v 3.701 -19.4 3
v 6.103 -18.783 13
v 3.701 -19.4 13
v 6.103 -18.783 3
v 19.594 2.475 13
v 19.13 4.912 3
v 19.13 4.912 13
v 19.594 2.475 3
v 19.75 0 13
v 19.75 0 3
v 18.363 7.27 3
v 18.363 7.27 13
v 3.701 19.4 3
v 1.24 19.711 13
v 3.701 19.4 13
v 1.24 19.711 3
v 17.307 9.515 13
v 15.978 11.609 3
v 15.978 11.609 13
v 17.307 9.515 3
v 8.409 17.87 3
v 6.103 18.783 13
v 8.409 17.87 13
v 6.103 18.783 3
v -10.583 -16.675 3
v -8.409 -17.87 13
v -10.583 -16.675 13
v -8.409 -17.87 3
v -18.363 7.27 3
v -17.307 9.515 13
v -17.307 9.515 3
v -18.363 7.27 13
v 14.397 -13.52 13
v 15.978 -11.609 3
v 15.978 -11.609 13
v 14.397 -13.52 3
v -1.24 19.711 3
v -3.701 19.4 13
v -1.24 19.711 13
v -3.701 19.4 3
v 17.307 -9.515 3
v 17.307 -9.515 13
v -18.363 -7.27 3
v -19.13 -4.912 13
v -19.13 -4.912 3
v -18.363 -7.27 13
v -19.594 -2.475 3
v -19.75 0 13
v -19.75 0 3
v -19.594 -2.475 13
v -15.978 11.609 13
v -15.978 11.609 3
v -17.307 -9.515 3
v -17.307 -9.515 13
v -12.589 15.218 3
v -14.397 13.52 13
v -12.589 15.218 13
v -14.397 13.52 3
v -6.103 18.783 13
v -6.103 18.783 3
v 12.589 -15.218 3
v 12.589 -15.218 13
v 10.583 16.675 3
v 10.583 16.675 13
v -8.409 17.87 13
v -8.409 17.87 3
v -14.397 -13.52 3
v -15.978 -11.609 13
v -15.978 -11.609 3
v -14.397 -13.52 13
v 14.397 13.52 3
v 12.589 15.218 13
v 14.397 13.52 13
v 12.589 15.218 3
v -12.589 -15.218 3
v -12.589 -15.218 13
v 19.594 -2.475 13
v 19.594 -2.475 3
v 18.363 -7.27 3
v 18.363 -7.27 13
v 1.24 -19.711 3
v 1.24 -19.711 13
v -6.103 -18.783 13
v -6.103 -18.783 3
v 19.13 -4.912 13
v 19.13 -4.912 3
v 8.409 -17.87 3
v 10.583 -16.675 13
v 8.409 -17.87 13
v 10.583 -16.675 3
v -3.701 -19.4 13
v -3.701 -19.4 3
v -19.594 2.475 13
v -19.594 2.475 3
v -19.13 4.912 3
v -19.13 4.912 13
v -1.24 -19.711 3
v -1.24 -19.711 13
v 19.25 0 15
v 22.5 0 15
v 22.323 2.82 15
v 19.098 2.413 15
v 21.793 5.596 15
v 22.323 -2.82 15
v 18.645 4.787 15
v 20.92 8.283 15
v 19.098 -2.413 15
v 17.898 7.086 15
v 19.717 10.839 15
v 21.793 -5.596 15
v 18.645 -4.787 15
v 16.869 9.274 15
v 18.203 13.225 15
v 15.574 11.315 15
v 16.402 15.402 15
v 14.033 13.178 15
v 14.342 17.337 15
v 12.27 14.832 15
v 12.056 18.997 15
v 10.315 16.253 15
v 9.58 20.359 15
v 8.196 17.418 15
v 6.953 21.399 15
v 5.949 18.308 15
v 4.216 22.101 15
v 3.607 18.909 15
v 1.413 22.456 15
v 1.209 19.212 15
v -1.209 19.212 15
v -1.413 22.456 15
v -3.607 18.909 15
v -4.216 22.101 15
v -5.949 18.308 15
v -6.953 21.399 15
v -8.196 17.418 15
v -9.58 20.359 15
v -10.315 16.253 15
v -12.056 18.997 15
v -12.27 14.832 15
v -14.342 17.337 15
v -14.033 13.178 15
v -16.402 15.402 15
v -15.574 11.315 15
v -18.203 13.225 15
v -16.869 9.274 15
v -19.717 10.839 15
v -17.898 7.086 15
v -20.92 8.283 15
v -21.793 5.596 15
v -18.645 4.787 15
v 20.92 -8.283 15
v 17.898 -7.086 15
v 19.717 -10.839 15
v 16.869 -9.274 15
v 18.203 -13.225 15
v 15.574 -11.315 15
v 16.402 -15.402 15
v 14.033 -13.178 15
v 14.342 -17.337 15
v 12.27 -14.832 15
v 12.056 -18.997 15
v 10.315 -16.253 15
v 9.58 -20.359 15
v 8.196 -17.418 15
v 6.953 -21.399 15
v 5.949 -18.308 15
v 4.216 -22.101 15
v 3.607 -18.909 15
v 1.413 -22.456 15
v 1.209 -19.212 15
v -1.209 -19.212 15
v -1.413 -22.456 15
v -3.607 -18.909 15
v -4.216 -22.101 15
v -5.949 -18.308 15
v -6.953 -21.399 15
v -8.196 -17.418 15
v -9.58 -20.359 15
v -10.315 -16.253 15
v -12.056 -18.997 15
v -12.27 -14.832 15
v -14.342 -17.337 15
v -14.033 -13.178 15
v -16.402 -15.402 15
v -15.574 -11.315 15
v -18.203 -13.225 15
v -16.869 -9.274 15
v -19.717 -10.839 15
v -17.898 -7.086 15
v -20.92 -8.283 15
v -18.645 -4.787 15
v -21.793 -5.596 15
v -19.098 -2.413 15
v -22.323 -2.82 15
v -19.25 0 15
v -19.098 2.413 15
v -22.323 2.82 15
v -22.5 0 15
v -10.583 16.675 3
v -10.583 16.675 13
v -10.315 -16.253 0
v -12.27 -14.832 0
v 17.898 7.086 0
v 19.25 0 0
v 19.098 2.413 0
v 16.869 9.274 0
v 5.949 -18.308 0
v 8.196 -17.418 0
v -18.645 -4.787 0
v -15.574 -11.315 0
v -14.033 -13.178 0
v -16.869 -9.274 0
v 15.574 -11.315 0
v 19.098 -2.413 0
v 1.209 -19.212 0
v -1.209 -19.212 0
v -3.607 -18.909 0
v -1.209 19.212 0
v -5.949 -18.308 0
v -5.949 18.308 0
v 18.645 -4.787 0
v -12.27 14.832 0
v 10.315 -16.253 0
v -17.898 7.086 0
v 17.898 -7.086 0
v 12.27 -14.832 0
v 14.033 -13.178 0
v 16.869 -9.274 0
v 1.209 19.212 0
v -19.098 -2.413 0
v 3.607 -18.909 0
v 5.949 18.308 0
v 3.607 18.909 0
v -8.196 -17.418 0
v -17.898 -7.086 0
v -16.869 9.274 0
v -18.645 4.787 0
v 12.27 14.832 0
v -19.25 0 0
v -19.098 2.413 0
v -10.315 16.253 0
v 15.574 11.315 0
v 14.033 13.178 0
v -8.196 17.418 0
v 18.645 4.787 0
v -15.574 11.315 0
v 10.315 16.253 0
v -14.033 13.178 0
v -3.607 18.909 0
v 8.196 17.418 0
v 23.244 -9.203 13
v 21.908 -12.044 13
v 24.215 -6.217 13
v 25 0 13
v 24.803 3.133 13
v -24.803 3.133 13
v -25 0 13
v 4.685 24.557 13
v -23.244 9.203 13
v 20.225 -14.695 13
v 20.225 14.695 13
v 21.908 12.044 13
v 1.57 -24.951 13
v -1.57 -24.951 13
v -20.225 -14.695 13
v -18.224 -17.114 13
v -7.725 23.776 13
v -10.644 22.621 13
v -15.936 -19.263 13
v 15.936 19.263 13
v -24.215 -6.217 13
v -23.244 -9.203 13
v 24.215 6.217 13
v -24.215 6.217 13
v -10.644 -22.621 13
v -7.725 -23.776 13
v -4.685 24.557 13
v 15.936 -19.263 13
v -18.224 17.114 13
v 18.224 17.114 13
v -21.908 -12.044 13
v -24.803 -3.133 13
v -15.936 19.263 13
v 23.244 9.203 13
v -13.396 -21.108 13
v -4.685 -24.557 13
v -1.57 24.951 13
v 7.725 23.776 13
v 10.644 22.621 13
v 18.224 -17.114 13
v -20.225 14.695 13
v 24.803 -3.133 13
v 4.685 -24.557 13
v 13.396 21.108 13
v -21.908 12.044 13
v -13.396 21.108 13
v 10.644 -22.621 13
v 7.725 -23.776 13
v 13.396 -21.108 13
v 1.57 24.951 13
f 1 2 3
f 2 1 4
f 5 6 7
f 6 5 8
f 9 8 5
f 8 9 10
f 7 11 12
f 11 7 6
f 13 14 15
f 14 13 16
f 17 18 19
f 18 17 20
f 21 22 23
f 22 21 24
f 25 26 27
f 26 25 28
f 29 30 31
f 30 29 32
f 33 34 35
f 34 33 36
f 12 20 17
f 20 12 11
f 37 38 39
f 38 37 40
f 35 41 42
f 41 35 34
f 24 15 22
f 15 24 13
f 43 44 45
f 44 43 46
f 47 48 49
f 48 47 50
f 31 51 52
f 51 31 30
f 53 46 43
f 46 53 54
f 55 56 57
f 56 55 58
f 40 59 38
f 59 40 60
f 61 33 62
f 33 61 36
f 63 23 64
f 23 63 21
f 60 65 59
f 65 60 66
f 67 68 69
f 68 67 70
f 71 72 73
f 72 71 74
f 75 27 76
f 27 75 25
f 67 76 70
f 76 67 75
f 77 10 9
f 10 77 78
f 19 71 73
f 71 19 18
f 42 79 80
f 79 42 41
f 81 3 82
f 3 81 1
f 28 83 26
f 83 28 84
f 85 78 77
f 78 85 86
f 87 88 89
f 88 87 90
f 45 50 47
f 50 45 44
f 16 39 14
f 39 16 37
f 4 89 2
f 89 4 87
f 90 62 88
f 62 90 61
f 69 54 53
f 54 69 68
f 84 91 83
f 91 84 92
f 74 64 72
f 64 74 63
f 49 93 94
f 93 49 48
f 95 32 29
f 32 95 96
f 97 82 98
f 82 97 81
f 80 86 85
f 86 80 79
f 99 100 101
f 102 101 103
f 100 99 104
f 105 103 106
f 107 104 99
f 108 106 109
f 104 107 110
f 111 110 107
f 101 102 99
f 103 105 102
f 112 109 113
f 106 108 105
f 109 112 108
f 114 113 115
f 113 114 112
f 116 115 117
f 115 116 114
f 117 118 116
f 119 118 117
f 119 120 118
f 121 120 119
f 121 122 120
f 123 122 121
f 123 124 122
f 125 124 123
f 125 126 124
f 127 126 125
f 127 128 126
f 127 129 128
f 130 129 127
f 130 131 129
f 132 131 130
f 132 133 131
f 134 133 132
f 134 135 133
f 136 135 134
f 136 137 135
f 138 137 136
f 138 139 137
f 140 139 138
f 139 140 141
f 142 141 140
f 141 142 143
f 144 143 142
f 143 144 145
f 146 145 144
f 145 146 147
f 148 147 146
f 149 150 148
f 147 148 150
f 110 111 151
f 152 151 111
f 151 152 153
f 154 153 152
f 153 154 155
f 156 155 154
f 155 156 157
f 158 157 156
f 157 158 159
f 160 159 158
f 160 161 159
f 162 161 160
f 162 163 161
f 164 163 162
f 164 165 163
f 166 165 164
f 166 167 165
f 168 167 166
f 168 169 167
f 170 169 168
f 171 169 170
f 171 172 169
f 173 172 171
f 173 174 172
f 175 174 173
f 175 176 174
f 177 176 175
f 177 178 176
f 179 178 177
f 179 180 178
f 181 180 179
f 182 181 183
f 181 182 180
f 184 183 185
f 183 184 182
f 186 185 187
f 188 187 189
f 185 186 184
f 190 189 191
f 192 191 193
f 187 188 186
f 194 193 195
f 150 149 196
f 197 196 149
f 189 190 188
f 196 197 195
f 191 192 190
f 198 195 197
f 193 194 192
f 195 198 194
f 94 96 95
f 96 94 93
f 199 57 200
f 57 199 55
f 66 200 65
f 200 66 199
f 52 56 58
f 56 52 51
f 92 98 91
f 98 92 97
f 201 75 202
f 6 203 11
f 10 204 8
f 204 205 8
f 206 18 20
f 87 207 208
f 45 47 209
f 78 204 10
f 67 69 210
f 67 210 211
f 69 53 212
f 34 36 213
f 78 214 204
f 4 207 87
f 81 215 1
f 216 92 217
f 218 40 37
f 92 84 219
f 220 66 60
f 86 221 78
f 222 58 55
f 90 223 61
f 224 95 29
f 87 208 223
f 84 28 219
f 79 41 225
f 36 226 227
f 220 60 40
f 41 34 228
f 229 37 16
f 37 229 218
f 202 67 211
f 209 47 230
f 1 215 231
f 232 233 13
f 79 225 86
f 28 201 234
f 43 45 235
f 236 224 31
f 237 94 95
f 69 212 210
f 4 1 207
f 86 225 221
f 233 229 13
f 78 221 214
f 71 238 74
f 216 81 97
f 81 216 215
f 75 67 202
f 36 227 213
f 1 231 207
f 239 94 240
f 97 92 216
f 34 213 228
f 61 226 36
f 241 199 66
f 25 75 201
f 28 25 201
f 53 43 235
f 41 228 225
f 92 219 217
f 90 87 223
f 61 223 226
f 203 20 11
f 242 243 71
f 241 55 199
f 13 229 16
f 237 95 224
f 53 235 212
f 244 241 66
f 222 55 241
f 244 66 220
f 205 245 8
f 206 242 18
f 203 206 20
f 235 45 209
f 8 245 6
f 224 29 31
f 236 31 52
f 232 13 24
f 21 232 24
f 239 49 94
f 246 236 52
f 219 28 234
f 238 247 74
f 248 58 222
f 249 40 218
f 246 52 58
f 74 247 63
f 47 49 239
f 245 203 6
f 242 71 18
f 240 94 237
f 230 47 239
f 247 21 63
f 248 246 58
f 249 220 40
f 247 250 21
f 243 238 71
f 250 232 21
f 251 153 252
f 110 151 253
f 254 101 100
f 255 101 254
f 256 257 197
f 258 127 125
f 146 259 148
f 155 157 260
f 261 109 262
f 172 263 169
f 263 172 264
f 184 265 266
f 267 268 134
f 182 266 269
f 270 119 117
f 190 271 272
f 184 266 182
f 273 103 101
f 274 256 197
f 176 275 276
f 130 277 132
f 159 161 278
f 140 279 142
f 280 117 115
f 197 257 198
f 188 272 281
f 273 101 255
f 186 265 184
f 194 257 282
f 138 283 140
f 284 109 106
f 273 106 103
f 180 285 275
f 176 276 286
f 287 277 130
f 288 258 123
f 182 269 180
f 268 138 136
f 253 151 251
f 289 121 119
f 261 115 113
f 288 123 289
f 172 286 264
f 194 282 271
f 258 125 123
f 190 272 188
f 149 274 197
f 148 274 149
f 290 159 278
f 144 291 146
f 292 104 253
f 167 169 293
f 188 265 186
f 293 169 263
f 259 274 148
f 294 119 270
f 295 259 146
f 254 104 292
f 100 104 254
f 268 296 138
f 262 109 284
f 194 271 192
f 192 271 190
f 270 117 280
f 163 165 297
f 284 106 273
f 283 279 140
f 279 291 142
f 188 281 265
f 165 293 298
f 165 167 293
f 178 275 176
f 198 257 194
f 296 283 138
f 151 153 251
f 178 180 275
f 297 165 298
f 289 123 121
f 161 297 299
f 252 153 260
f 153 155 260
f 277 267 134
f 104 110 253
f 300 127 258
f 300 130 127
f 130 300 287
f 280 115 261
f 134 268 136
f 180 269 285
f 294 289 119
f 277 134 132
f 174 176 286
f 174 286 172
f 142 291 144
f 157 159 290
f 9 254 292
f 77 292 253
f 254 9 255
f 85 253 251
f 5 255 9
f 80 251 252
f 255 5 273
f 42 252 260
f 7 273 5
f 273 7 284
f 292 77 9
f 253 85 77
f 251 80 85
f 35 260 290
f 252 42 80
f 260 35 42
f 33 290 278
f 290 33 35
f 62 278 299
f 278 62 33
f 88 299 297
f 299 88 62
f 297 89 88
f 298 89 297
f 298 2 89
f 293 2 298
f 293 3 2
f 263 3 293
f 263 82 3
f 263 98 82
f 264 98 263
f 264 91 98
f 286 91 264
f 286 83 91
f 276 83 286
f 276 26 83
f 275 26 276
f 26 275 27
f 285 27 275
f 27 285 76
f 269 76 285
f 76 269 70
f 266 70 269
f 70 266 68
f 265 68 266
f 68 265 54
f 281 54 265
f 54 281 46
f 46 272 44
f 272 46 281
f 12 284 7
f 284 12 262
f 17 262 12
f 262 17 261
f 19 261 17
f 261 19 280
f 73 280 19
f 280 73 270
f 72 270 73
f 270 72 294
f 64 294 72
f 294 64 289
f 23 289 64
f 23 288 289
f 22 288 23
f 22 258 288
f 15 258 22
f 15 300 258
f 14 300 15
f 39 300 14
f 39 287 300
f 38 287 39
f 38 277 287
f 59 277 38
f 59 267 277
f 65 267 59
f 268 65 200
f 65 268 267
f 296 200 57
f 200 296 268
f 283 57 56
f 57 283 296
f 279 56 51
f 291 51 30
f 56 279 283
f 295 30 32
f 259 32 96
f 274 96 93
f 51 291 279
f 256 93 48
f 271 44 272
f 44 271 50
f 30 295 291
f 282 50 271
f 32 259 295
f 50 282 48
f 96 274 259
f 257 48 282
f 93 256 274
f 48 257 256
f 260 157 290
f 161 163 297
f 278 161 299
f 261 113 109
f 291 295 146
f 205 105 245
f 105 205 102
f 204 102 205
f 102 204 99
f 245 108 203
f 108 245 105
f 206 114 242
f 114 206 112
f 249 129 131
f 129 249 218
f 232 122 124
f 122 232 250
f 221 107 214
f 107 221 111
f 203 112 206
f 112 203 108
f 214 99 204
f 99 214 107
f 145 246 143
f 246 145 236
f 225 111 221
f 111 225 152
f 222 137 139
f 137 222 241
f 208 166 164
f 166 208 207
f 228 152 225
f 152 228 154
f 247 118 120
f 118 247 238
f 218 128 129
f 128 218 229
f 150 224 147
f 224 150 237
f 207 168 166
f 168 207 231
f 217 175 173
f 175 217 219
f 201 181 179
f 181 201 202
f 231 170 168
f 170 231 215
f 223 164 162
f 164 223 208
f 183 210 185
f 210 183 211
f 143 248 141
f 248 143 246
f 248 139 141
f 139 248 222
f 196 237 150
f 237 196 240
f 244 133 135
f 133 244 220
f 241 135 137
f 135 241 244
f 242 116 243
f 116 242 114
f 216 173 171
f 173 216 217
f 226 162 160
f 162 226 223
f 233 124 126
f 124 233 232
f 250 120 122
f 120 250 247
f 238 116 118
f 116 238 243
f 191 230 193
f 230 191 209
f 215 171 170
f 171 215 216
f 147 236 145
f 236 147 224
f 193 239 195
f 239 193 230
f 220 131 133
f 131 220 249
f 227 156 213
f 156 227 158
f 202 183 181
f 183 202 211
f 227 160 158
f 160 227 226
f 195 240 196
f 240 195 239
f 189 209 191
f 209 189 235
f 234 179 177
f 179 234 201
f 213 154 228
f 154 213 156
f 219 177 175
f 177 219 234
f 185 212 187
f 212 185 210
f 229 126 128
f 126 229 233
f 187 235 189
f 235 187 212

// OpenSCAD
$fn = 50;

difference() {
	union() {
		translate(v = [0, 0, 3.0]) {
			cylinder(h = 12, r = 19.75);
		}
		cylinder(h = 3, r1 = 19.25, r2 = 19.75);
		translate(v = [0, 0, 13.0]) {
			cylinder(h = 2, r1 = 25.0, r2 = 22.5);
		}
	}
	union() {
		cylinder(h = 15, r = 19.25);
	}
}
